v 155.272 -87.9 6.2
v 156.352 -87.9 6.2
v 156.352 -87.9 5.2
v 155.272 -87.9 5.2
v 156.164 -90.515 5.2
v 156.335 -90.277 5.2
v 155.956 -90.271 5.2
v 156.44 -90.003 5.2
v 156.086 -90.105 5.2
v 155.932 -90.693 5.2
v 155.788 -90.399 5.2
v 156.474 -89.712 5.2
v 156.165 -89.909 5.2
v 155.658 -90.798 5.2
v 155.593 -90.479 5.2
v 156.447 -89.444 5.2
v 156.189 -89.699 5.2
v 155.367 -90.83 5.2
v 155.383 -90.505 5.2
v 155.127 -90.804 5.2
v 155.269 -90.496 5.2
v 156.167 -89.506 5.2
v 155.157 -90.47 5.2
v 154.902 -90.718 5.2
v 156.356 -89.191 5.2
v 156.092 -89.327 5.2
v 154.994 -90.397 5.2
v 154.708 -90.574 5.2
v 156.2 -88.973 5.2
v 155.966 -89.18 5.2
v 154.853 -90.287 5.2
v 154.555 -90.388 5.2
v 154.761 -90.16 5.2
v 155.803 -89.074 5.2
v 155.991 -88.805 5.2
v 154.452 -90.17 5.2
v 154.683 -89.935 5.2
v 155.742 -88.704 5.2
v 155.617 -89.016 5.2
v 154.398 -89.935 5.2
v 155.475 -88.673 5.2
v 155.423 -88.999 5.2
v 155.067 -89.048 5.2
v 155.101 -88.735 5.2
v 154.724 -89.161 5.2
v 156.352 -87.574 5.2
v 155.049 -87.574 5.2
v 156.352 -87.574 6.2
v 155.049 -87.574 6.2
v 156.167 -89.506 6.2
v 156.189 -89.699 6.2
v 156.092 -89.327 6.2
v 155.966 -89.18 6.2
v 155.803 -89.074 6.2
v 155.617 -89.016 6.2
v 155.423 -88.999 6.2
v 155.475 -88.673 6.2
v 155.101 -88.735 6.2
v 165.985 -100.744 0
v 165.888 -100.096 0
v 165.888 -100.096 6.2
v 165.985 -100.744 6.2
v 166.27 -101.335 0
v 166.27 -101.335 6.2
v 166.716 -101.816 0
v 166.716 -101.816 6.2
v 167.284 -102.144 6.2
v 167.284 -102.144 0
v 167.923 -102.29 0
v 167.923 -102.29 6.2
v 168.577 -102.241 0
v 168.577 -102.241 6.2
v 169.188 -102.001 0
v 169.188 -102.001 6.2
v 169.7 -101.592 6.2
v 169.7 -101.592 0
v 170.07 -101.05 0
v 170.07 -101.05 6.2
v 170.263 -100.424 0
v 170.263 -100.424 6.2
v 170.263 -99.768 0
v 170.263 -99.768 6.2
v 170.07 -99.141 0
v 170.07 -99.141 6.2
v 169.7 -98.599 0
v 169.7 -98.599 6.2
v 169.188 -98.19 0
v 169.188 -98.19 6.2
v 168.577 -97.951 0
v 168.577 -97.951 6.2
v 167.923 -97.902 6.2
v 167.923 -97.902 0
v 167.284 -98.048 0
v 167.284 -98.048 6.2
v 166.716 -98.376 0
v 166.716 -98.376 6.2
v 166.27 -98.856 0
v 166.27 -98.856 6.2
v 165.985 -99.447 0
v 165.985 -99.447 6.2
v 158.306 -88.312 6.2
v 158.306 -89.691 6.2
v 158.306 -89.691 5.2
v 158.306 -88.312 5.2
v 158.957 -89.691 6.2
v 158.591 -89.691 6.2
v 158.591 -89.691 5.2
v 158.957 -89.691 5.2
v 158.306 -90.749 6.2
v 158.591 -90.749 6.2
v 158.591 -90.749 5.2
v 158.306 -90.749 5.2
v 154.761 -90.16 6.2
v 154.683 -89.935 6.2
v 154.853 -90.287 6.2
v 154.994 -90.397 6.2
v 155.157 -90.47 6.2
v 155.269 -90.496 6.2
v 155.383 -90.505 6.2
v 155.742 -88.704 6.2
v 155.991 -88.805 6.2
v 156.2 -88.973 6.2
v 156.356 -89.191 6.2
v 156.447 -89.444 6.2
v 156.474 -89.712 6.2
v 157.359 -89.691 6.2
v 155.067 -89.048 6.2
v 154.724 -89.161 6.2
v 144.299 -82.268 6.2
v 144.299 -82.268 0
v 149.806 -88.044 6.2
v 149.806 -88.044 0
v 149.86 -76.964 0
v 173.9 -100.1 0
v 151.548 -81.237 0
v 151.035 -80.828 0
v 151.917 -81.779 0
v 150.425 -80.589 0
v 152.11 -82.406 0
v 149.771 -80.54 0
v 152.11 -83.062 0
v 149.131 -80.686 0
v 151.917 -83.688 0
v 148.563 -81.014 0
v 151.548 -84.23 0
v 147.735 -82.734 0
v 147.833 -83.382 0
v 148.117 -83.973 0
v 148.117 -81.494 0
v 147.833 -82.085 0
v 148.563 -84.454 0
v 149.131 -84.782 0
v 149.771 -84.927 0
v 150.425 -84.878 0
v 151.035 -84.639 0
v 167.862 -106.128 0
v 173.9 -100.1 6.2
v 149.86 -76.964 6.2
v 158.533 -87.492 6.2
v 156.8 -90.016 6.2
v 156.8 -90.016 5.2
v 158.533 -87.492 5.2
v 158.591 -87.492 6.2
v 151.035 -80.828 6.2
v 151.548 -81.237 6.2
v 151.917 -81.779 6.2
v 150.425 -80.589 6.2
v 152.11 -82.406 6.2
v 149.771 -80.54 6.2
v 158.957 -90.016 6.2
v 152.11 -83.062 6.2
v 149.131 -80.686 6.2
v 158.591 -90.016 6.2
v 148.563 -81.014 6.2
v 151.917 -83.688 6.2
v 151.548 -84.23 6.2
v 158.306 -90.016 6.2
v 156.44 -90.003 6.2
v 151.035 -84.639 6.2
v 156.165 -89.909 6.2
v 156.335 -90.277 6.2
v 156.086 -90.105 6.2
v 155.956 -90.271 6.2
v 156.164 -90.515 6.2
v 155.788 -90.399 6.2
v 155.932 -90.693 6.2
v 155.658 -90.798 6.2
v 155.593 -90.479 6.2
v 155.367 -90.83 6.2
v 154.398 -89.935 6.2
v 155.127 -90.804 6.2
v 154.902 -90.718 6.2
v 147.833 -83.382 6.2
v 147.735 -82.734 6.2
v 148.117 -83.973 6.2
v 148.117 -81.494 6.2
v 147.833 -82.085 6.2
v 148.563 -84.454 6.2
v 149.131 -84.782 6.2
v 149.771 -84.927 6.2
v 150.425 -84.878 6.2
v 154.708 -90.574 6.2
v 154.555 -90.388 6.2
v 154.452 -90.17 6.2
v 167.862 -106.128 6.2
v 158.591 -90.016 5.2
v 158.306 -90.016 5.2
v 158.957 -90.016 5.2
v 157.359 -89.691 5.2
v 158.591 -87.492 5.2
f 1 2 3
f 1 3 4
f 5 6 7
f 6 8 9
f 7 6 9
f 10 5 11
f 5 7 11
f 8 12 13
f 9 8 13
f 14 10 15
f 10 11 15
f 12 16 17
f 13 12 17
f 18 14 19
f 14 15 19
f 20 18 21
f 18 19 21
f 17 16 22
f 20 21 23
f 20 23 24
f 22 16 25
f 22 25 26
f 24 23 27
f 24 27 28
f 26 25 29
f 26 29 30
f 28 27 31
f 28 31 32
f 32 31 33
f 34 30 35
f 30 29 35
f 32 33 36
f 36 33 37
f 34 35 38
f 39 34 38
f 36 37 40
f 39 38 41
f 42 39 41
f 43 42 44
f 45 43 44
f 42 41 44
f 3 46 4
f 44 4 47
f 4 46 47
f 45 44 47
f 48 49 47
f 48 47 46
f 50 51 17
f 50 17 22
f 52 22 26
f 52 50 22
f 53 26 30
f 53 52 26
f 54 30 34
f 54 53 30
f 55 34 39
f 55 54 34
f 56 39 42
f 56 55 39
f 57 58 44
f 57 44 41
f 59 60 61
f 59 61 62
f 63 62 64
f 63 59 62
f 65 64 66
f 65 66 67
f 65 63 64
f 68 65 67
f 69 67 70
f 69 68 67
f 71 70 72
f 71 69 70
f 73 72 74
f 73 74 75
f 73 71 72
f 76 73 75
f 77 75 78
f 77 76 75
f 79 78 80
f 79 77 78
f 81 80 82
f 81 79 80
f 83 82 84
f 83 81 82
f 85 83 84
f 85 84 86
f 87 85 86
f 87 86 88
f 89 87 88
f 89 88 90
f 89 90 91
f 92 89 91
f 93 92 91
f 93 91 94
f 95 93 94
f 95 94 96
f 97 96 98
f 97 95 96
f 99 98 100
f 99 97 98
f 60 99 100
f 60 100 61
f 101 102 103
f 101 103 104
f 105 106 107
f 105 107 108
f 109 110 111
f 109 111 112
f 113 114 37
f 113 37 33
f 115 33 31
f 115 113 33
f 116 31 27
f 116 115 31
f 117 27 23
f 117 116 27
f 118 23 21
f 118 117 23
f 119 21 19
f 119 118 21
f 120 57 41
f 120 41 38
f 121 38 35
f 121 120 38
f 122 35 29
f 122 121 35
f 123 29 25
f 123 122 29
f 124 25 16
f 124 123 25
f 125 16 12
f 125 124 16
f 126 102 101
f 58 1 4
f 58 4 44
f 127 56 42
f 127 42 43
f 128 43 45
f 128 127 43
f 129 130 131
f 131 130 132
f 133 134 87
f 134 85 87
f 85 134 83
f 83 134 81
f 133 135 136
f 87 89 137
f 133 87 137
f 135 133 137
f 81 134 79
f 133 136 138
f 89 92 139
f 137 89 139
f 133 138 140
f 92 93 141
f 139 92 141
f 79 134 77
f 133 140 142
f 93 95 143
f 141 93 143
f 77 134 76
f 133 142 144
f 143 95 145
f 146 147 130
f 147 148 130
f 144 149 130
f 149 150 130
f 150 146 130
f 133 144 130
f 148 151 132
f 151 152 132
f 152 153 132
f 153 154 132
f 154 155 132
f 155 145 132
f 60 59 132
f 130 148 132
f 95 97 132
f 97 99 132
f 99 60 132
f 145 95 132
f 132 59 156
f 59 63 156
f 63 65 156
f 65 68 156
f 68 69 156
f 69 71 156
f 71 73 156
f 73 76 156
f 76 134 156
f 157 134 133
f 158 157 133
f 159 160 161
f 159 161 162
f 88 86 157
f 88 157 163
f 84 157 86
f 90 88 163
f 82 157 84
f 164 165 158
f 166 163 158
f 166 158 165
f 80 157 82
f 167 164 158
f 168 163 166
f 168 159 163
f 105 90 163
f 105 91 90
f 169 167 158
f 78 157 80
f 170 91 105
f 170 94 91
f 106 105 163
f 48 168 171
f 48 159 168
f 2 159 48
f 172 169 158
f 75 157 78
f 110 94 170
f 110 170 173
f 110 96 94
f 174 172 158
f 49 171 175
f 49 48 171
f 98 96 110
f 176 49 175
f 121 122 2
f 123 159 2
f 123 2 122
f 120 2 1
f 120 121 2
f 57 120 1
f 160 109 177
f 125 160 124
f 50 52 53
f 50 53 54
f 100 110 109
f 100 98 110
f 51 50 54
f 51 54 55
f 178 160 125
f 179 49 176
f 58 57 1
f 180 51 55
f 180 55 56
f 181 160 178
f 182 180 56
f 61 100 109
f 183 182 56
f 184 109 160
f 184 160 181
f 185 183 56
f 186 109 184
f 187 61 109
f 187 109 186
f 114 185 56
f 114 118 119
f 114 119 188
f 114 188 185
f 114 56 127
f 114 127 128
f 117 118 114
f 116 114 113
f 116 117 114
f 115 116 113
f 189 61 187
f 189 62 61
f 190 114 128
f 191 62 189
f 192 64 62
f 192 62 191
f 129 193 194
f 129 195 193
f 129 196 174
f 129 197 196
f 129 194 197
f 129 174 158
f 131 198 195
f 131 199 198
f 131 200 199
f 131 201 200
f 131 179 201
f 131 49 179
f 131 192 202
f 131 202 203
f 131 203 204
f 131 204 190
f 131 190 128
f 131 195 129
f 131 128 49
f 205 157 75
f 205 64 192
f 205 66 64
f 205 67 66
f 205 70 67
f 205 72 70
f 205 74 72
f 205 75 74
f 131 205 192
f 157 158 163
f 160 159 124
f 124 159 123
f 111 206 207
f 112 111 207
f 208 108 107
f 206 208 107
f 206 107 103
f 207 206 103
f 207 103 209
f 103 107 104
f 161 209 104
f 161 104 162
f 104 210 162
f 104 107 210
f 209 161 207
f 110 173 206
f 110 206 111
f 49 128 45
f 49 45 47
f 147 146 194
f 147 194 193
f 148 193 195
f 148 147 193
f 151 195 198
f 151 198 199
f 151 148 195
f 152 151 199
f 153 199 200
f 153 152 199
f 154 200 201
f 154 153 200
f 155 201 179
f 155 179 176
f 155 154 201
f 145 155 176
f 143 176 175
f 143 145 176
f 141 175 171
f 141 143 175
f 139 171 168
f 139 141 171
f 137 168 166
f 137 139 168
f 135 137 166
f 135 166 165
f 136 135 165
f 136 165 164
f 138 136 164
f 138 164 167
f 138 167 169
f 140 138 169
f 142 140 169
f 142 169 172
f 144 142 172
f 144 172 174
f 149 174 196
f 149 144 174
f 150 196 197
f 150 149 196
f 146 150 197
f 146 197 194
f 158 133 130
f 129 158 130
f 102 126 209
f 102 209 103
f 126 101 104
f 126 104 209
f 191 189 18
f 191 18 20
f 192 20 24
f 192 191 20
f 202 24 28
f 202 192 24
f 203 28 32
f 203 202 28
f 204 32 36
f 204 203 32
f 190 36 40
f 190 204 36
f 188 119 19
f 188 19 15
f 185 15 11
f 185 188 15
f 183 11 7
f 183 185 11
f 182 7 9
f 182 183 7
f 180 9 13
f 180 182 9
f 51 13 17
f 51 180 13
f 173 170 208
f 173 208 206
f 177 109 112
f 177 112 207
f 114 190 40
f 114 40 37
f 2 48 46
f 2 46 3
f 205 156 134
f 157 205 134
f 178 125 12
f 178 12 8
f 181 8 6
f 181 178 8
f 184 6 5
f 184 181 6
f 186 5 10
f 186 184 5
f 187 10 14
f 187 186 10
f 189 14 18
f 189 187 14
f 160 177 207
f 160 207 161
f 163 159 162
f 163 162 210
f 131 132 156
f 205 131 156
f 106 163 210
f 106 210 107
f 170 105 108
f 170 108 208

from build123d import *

# Parameters (mm, degrees)
SKETCH1_R           = 2.2
BOSS_EXTRUDE1_DEPTH = 6.2
CUT_EXTRUDE1_DEPTH  = 1


with BuildPart() as part:
    # Sketch1 → Boss-Extrude1 (new body)
    with BuildSketch(Plane(origin=(0, 0, 0), x_dir=(-1, 0, 0), z_dir=(0, 0, 1))):
        Polygon((-144.298520867, 82.267611076), (-149.806405315, 88.04360735), (-167.861763168, 106.127941253), (-173.899609442, 100.09976926), (-149.860209976, 76.964086023), align=None)
        with Locations((-149.935011138, 82.733649845)):
            Circle(SKETCH1_R, mode=Mode.SUBTRACT)
        with Locations((-168.087755201, 100.095717423)):
            Circle(SKETCH1_R, mode=Mode.SUBTRACT)
    extrude(amount=BOSS_EXTRUDE1_DEPTH)

    # Sketch2 → Cut-Extrude1 (cut)
    with BuildSketch(Plane.XY.offset(6.2)):
        with BuildLine():
            Line((156.351932178, -87.573874819), (156.351932178, -87.899515844))
            Line((156.351932178, -87.899515844), (155.271974245, -87.899515844))
            Line((155.271974245, -87.899515844), (155.100885503, -88.73460699))
            add(Edge.make_bspline(
                [(155.100885503, -88.73460699), (155.134500475, -88.725326672), (155.199624166, -88.707347524), (155.295744897, -88.687385146), (155.386996396, -88.675351494), (155.446210482, -88.673708376), (155.474863868, -88.67291328)],
                knots=[0, 0, 0, 0, 0.000104595, 0.000202637, 0.000294305, 0.000380252, 0.000380252, 0.000380252, 0.000380252], degree=3))
            add(Edge.make_bspline(
                [(155.474863868, -88.67291328), (155.510318404, -88.673680665), (155.580030878, -88.675189535), (155.682029066, -88.689678284), (155.779395334, -88.712483778), (155.871926055, -88.744343108), (155.959792412, -88.785082652), (156.042185985, -88.835973312), (156.120343521, -88.895421405), (156.192862874, -88.963770095), (156.258652782, -89.038991847), (156.316497644, -89.119870773), (156.365630851, -89.205620866), (156.405146679, -89.297061419), (156.436701039, -89.393181508), (156.457703206, -89.494992493), (156.471688363, -89.601534717), (156.473250814, -89.674382434), (156.474047562, -89.711530067)],
                knots=[0, 0, 0, 0, 0.000106308, 0.000209029, 0.000308378, 0.000405929, 0.000502102, 0.000598312, 0.00069588, 0.000796219, 0.000896736, 0.000995218, 0.001094066, 0.001192613, 0.001293582, 0.001396995, 0.001504047, 0.001615439, 0.001615439, 0.001615439, 0.001615439], degree=3))
            add(Edge.make_bspline(
                [(156.474047562, -89.711530067), (156.473444244, -89.737403796), (156.472245761, -89.788801592), (156.466151042, -89.865132402), (156.4544165, -89.939847258), (156.438661493, -90.012956071), (156.418212299, -90.08432043), (156.393457229, -90.154144601), (156.363162261, -90.221993995), (156.329932371, -90.288510603), (156.292515923, -90.352190677), (156.250988277, -90.411743687), (156.207113867, -90.468062999), (156.159904896, -90.5205446), (156.108922565, -90.568843623), (156.054784309, -90.613246707), (155.997922128, -90.654504771), (155.937456301, -90.690943062), (155.874734192, -90.724473744), (155.808850023, -90.751981524), (155.741303531, -90.776574646), (155.671122536, -90.796177575), (155.598466006, -90.811537821), (155.523214174, -90.821970508), (155.445761709, -90.829569134), (155.393260805, -90.8300448), (155.366740872, -90.830285075)],
                knots=[0, 0, 0, 0, 7.7636e-05, 0.000154223, 0.000229512, 0.000304362, 0.000378447, 0.000452077, 0.000526407, 0.000601214, 0.00067506, 0.000747747, 0.00081887, 0.000889121, 0.000959302, 0.001029336, 0.001099058, 0.00116985, 0.001240974, 0.00131221, 0.00138383, 0.001456517, 0.001530612, 0.001606437, 0.001684346, 0.001763871, 0.001763871, 0.001763871, 0.001763871], degree=3))
            add(Edge.make_bspline(
                [(155.366740872, -90.830285075), (155.335105008, -90.829658386), (155.272865183, -90.82842545), (155.181678668, -90.815527253), (155.093944705, -90.797054272), (155.010369541, -90.769262798), (154.930204181, -90.734440038), (154.854527858, -90.69042894), (154.781406904, -90.640555039), (154.713813842, -90.58169929), (154.651079368, -90.517368635), (154.594921321, -90.447557061), (154.54490729, -90.373416781), (154.501838191, -90.294587742), (154.4651007, -90.211277074), (154.436239961, -90.123172638), (154.412946025, -90.030734777), (154.403091351, -89.967095521), (154.398086024, -89.934772255)],
                knots=[0, 0, 0, 0, 9.4843e-05, 0.000186593, 0.000275792, 0.000363484, 0.000450342, 0.000537514, 0.000625728, 0.000715478, 0.000805885, 0.000894984, 0.00098389, 0.001073836, 0.001164117, 0.001256635, 0.001351658, 0.001449737, 0.001449737, 0.001449737, 0.001449737], degree=3))
            Line((154.398086024, -89.934772255), (154.683021921, -89.934772255))
            add(Edge.make_bspline(
                [(154.683021921, -89.934772255), (154.690032827, -89.965049465), (154.703508177, -90.023243945), (154.733086249, -90.105005947), (154.769250293, -90.177866957), (154.812252809, -90.242790794), (154.863551765, -90.29940467), (154.922089176, -90.34985729), (154.987718896, -90.3953733), (155.06064704, -90.433312525), (155.137584619, -90.46566918), (155.21810916, -90.48721536), (155.300028103, -90.502365456), (155.35543491, -90.503881982), (155.38327733, -90.50464405)],
                knots=[0, 0, 0, 0, 9.3172e-05, 0.000179081, 0.000260145, 0.000336703, 0.000411917, 0.000488562, 0.000568128, 0.000650923, 0.00073478, 0.000817953, 0.000900557, 0.000983994, 0.000983994, 0.000983994, 0.000983994], degree=3))
            add(Edge.make_bspline(
                [(155.38327733, -90.50464405), (155.410453919, -90.503899487), (155.463964845, -90.502433437), (155.542715174, -90.491149476), (155.618745424, -90.473770822), (155.691305384, -90.447763167), (155.76166478, -90.41615403), (155.828043843, -90.375591068), (155.892362882, -90.32890948), (155.952622689, -90.275427394), (156.007812761, -90.2164906), (156.056577242, -90.153464679), (156.097196299, -90.086230111), (156.131426526, -90.015950894), (156.157419162, -89.941856774), (156.175962052, -89.864294994), (156.186850541, -89.783073976), (156.188348397, -89.727675388), (156.189111665, -89.699445732)],
                knots=[0, 0, 0, 0, 8.15e-05, 0.000160473, 0.000238226, 0.000315066, 0.000391338, 0.000469218, 0.000547964, 0.000629516, 0.000710512, 0.000789892, 0.000868102, 0.000945761, 0.001024012, 0.00110315, 0.001184644, 0.001269321, 0.001269321, 0.001269321, 0.001269321], degree=3))
            add(Edge.make_bspline(
                [(156.189111665, -89.699445732), (156.18851433, -89.673977015), (156.187345132, -89.624125624), (156.1777924, -89.551192058), (156.16117629, -89.482182941), (156.138113198, -89.416765029), (156.108831074, -89.354876621), (156.073047633, -89.296453844), (156.030091336, -89.242266724), (155.981022266, -89.192289908), (155.927266758, -89.146166343), (155.867899934, -89.106847064), (155.804164143, -89.073769082), (155.736827292, -89.045223112), (155.664287706, -89.024721007), (155.587981903, -89.009328711), (155.50708589, -89.000424775), (155.451776766, -88.999189348), (155.423346441, -88.998554306)],
                knots=[0, 0, 0, 0, 7.6388e-05, 0.000149519, 0.000220172, 0.000288967, 0.000357247, 0.000425206, 0.000494043, 0.000564207, 0.000635056, 0.000706145, 0.000777268, 0.000850264, 0.000925136, 0.001002969, 0.001083601, 0.001168886, 0.001168886, 0.001168886, 0.001168886], degree=3))
            add(Edge.make_bspline(
                [(155.423346441, -88.998554306), (155.398736627, -88.999080985), (155.347923604, -89.000168444), (155.269979326, -89.008175337), (155.188071834, -89.021092412), (155.102515113, -89.038859936), (155.013052224, -89.062110984), (154.91987196, -89.089973424), (154.822778404, -89.123285523), (154.757357326, -89.148442603), (154.72372705, -89.161374819)],
                knots=[0, 0, 0, 0, 7.3822e-05, 0.000152423, 0.000234822, 0.000322511, 0.00041445, 0.000512043, 0.000614219, 0.000722306, 0.000722306, 0.000722306, 0.000722306], degree=3))
            Line((154.72372705, -89.161374819), (155.049368075, -87.573874819))
            Line((155.049368075, -87.573874819), (156.351932178, -87.573874819))
        make_face()
        Polygon((158.532836625, -87.492464562), (158.590714229, -87.492464562), (158.590714229, -89.690541485), (158.957060383, -89.690541485), (158.957060383, -90.016182511), (158.590714229, -90.016182511), (158.590714229, -90.748874819), (158.305778332, -90.748874819), (158.305778332, -90.016182511), (156.799688588, -90.016182511), align=None)
        Polygon((158.305778332, -89.690541485), (158.305778332, -88.311655268), (157.359384101, -89.690541485), align=None, mode=Mode.SUBTRACT)
    extrude(amount=-CUT_EXTRUDE1_DEPTH, mode=Mode.SUBTRACT)


solid = part.part
